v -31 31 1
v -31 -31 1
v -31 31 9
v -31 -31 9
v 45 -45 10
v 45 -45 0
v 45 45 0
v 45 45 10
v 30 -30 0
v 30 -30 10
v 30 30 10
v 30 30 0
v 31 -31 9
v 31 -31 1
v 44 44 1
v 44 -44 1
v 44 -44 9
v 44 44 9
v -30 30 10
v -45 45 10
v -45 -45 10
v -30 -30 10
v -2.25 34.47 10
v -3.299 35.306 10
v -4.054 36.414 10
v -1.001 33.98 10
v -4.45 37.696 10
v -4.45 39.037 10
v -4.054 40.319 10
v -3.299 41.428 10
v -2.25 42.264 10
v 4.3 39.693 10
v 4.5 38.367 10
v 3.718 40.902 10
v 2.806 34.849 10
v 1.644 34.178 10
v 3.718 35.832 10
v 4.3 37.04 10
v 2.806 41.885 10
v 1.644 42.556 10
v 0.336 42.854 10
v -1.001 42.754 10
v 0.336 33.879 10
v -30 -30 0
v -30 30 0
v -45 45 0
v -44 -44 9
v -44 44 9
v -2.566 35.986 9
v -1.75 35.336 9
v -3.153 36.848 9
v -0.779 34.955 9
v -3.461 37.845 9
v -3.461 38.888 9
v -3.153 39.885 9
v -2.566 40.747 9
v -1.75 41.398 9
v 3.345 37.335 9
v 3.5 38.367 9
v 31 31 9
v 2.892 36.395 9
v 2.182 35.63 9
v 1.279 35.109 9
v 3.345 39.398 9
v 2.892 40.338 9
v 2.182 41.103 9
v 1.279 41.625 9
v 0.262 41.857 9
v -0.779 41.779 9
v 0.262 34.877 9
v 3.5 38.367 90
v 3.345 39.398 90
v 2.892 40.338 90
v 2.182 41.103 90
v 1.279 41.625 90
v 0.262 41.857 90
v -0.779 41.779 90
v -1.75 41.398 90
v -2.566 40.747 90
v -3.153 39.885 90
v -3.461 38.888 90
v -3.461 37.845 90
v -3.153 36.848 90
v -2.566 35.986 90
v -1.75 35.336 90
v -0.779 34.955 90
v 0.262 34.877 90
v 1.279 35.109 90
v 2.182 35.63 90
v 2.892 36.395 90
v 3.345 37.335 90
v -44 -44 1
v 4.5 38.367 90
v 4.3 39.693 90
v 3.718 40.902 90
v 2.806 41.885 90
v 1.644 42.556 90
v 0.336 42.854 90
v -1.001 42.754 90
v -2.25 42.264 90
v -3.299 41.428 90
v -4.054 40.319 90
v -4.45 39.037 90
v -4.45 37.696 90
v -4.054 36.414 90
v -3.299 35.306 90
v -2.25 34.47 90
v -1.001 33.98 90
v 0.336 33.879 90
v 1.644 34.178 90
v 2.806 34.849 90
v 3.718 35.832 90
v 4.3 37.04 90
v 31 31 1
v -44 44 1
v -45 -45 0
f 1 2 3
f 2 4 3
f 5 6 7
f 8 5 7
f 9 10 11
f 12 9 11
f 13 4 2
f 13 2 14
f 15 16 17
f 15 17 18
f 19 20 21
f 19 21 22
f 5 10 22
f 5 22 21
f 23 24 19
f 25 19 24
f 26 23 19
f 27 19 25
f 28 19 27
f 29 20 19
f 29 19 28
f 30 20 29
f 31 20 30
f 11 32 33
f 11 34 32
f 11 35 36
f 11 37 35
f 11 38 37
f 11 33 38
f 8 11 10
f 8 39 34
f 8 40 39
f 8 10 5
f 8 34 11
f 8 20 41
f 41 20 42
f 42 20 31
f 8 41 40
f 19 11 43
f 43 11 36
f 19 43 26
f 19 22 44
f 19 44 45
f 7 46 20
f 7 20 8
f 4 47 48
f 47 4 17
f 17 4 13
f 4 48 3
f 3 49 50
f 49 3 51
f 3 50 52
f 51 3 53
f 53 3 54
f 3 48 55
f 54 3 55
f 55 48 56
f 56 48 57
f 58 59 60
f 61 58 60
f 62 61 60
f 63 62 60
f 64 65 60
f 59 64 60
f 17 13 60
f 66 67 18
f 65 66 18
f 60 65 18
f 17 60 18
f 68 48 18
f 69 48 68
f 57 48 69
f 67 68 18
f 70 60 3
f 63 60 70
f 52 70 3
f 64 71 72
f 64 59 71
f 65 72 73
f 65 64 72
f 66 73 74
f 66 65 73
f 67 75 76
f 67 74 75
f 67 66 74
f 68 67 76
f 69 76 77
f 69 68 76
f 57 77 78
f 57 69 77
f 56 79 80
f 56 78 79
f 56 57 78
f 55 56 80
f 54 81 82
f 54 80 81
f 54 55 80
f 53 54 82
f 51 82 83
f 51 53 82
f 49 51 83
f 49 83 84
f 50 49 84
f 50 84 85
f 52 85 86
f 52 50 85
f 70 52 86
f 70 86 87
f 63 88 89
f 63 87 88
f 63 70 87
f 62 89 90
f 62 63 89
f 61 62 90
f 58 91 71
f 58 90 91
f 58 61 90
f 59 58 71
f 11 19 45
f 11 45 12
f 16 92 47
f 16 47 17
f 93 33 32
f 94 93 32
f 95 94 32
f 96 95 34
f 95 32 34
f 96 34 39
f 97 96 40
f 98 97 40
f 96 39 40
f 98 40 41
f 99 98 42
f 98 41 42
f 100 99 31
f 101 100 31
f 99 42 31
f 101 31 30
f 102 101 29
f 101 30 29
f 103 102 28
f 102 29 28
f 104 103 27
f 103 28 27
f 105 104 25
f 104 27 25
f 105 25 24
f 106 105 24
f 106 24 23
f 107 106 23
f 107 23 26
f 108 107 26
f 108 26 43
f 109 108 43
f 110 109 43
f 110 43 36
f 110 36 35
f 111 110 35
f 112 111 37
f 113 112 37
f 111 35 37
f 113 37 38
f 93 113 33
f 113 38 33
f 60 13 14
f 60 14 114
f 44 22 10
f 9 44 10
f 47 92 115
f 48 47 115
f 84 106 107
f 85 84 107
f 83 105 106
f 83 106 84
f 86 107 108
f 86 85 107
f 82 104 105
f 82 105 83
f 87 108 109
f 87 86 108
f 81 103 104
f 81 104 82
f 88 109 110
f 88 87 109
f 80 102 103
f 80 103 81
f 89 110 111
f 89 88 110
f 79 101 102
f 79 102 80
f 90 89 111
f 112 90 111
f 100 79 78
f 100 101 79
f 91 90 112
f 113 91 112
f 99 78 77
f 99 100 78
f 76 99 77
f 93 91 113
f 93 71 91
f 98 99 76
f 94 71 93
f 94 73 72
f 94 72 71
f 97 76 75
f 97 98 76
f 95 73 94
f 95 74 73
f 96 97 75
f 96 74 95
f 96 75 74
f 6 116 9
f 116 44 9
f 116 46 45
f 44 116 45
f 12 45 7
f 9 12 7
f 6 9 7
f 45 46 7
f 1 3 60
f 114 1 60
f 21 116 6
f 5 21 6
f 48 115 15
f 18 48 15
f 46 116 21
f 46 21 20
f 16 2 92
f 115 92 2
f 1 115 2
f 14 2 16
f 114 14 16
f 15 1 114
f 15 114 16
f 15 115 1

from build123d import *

# Parameters (mm, degrees)
F0_W     = 90
F0_H     = 90
F1_DEPTH = 10
F2_W     = 60
F2_H     = 60
F3_DEPTH = 10
F4_R     = 4.5
F5_DEPTH = 80
F6_T     = -1


with BuildPart() as f1:
    # F0 (on Top) → F1 (new body)
    with BuildSketch(Plane.XY):
        Rectangle(F0_W, F0_H)
    extrude(amount=F1_DEPTH)

    # F2 (on face) → F3 (cut)
    with BuildSketch(Plane.XY.offset(10)):
        Rectangle(F2_W, F2_H)
    extrude(amount=-F3_DEPTH, mode=Mode.SUBTRACT)

    # F4 (on face) → F5 (join)
    with BuildSketch(Plane.XY.offset(10)):
        with Locations((0, 38.3668020368)):
            Circle(F4_R)
    extrude(amount=F5_DEPTH)

    # F6
    f6_openings = [f1.faces().sort_by_distance(p)[0] for p in [
        (0, 38.366802, 90),
    ]]
    offset(amount=F6_T, openings=f6_openings, kind=Kind.INTERSECTION)


solid = f1.part
